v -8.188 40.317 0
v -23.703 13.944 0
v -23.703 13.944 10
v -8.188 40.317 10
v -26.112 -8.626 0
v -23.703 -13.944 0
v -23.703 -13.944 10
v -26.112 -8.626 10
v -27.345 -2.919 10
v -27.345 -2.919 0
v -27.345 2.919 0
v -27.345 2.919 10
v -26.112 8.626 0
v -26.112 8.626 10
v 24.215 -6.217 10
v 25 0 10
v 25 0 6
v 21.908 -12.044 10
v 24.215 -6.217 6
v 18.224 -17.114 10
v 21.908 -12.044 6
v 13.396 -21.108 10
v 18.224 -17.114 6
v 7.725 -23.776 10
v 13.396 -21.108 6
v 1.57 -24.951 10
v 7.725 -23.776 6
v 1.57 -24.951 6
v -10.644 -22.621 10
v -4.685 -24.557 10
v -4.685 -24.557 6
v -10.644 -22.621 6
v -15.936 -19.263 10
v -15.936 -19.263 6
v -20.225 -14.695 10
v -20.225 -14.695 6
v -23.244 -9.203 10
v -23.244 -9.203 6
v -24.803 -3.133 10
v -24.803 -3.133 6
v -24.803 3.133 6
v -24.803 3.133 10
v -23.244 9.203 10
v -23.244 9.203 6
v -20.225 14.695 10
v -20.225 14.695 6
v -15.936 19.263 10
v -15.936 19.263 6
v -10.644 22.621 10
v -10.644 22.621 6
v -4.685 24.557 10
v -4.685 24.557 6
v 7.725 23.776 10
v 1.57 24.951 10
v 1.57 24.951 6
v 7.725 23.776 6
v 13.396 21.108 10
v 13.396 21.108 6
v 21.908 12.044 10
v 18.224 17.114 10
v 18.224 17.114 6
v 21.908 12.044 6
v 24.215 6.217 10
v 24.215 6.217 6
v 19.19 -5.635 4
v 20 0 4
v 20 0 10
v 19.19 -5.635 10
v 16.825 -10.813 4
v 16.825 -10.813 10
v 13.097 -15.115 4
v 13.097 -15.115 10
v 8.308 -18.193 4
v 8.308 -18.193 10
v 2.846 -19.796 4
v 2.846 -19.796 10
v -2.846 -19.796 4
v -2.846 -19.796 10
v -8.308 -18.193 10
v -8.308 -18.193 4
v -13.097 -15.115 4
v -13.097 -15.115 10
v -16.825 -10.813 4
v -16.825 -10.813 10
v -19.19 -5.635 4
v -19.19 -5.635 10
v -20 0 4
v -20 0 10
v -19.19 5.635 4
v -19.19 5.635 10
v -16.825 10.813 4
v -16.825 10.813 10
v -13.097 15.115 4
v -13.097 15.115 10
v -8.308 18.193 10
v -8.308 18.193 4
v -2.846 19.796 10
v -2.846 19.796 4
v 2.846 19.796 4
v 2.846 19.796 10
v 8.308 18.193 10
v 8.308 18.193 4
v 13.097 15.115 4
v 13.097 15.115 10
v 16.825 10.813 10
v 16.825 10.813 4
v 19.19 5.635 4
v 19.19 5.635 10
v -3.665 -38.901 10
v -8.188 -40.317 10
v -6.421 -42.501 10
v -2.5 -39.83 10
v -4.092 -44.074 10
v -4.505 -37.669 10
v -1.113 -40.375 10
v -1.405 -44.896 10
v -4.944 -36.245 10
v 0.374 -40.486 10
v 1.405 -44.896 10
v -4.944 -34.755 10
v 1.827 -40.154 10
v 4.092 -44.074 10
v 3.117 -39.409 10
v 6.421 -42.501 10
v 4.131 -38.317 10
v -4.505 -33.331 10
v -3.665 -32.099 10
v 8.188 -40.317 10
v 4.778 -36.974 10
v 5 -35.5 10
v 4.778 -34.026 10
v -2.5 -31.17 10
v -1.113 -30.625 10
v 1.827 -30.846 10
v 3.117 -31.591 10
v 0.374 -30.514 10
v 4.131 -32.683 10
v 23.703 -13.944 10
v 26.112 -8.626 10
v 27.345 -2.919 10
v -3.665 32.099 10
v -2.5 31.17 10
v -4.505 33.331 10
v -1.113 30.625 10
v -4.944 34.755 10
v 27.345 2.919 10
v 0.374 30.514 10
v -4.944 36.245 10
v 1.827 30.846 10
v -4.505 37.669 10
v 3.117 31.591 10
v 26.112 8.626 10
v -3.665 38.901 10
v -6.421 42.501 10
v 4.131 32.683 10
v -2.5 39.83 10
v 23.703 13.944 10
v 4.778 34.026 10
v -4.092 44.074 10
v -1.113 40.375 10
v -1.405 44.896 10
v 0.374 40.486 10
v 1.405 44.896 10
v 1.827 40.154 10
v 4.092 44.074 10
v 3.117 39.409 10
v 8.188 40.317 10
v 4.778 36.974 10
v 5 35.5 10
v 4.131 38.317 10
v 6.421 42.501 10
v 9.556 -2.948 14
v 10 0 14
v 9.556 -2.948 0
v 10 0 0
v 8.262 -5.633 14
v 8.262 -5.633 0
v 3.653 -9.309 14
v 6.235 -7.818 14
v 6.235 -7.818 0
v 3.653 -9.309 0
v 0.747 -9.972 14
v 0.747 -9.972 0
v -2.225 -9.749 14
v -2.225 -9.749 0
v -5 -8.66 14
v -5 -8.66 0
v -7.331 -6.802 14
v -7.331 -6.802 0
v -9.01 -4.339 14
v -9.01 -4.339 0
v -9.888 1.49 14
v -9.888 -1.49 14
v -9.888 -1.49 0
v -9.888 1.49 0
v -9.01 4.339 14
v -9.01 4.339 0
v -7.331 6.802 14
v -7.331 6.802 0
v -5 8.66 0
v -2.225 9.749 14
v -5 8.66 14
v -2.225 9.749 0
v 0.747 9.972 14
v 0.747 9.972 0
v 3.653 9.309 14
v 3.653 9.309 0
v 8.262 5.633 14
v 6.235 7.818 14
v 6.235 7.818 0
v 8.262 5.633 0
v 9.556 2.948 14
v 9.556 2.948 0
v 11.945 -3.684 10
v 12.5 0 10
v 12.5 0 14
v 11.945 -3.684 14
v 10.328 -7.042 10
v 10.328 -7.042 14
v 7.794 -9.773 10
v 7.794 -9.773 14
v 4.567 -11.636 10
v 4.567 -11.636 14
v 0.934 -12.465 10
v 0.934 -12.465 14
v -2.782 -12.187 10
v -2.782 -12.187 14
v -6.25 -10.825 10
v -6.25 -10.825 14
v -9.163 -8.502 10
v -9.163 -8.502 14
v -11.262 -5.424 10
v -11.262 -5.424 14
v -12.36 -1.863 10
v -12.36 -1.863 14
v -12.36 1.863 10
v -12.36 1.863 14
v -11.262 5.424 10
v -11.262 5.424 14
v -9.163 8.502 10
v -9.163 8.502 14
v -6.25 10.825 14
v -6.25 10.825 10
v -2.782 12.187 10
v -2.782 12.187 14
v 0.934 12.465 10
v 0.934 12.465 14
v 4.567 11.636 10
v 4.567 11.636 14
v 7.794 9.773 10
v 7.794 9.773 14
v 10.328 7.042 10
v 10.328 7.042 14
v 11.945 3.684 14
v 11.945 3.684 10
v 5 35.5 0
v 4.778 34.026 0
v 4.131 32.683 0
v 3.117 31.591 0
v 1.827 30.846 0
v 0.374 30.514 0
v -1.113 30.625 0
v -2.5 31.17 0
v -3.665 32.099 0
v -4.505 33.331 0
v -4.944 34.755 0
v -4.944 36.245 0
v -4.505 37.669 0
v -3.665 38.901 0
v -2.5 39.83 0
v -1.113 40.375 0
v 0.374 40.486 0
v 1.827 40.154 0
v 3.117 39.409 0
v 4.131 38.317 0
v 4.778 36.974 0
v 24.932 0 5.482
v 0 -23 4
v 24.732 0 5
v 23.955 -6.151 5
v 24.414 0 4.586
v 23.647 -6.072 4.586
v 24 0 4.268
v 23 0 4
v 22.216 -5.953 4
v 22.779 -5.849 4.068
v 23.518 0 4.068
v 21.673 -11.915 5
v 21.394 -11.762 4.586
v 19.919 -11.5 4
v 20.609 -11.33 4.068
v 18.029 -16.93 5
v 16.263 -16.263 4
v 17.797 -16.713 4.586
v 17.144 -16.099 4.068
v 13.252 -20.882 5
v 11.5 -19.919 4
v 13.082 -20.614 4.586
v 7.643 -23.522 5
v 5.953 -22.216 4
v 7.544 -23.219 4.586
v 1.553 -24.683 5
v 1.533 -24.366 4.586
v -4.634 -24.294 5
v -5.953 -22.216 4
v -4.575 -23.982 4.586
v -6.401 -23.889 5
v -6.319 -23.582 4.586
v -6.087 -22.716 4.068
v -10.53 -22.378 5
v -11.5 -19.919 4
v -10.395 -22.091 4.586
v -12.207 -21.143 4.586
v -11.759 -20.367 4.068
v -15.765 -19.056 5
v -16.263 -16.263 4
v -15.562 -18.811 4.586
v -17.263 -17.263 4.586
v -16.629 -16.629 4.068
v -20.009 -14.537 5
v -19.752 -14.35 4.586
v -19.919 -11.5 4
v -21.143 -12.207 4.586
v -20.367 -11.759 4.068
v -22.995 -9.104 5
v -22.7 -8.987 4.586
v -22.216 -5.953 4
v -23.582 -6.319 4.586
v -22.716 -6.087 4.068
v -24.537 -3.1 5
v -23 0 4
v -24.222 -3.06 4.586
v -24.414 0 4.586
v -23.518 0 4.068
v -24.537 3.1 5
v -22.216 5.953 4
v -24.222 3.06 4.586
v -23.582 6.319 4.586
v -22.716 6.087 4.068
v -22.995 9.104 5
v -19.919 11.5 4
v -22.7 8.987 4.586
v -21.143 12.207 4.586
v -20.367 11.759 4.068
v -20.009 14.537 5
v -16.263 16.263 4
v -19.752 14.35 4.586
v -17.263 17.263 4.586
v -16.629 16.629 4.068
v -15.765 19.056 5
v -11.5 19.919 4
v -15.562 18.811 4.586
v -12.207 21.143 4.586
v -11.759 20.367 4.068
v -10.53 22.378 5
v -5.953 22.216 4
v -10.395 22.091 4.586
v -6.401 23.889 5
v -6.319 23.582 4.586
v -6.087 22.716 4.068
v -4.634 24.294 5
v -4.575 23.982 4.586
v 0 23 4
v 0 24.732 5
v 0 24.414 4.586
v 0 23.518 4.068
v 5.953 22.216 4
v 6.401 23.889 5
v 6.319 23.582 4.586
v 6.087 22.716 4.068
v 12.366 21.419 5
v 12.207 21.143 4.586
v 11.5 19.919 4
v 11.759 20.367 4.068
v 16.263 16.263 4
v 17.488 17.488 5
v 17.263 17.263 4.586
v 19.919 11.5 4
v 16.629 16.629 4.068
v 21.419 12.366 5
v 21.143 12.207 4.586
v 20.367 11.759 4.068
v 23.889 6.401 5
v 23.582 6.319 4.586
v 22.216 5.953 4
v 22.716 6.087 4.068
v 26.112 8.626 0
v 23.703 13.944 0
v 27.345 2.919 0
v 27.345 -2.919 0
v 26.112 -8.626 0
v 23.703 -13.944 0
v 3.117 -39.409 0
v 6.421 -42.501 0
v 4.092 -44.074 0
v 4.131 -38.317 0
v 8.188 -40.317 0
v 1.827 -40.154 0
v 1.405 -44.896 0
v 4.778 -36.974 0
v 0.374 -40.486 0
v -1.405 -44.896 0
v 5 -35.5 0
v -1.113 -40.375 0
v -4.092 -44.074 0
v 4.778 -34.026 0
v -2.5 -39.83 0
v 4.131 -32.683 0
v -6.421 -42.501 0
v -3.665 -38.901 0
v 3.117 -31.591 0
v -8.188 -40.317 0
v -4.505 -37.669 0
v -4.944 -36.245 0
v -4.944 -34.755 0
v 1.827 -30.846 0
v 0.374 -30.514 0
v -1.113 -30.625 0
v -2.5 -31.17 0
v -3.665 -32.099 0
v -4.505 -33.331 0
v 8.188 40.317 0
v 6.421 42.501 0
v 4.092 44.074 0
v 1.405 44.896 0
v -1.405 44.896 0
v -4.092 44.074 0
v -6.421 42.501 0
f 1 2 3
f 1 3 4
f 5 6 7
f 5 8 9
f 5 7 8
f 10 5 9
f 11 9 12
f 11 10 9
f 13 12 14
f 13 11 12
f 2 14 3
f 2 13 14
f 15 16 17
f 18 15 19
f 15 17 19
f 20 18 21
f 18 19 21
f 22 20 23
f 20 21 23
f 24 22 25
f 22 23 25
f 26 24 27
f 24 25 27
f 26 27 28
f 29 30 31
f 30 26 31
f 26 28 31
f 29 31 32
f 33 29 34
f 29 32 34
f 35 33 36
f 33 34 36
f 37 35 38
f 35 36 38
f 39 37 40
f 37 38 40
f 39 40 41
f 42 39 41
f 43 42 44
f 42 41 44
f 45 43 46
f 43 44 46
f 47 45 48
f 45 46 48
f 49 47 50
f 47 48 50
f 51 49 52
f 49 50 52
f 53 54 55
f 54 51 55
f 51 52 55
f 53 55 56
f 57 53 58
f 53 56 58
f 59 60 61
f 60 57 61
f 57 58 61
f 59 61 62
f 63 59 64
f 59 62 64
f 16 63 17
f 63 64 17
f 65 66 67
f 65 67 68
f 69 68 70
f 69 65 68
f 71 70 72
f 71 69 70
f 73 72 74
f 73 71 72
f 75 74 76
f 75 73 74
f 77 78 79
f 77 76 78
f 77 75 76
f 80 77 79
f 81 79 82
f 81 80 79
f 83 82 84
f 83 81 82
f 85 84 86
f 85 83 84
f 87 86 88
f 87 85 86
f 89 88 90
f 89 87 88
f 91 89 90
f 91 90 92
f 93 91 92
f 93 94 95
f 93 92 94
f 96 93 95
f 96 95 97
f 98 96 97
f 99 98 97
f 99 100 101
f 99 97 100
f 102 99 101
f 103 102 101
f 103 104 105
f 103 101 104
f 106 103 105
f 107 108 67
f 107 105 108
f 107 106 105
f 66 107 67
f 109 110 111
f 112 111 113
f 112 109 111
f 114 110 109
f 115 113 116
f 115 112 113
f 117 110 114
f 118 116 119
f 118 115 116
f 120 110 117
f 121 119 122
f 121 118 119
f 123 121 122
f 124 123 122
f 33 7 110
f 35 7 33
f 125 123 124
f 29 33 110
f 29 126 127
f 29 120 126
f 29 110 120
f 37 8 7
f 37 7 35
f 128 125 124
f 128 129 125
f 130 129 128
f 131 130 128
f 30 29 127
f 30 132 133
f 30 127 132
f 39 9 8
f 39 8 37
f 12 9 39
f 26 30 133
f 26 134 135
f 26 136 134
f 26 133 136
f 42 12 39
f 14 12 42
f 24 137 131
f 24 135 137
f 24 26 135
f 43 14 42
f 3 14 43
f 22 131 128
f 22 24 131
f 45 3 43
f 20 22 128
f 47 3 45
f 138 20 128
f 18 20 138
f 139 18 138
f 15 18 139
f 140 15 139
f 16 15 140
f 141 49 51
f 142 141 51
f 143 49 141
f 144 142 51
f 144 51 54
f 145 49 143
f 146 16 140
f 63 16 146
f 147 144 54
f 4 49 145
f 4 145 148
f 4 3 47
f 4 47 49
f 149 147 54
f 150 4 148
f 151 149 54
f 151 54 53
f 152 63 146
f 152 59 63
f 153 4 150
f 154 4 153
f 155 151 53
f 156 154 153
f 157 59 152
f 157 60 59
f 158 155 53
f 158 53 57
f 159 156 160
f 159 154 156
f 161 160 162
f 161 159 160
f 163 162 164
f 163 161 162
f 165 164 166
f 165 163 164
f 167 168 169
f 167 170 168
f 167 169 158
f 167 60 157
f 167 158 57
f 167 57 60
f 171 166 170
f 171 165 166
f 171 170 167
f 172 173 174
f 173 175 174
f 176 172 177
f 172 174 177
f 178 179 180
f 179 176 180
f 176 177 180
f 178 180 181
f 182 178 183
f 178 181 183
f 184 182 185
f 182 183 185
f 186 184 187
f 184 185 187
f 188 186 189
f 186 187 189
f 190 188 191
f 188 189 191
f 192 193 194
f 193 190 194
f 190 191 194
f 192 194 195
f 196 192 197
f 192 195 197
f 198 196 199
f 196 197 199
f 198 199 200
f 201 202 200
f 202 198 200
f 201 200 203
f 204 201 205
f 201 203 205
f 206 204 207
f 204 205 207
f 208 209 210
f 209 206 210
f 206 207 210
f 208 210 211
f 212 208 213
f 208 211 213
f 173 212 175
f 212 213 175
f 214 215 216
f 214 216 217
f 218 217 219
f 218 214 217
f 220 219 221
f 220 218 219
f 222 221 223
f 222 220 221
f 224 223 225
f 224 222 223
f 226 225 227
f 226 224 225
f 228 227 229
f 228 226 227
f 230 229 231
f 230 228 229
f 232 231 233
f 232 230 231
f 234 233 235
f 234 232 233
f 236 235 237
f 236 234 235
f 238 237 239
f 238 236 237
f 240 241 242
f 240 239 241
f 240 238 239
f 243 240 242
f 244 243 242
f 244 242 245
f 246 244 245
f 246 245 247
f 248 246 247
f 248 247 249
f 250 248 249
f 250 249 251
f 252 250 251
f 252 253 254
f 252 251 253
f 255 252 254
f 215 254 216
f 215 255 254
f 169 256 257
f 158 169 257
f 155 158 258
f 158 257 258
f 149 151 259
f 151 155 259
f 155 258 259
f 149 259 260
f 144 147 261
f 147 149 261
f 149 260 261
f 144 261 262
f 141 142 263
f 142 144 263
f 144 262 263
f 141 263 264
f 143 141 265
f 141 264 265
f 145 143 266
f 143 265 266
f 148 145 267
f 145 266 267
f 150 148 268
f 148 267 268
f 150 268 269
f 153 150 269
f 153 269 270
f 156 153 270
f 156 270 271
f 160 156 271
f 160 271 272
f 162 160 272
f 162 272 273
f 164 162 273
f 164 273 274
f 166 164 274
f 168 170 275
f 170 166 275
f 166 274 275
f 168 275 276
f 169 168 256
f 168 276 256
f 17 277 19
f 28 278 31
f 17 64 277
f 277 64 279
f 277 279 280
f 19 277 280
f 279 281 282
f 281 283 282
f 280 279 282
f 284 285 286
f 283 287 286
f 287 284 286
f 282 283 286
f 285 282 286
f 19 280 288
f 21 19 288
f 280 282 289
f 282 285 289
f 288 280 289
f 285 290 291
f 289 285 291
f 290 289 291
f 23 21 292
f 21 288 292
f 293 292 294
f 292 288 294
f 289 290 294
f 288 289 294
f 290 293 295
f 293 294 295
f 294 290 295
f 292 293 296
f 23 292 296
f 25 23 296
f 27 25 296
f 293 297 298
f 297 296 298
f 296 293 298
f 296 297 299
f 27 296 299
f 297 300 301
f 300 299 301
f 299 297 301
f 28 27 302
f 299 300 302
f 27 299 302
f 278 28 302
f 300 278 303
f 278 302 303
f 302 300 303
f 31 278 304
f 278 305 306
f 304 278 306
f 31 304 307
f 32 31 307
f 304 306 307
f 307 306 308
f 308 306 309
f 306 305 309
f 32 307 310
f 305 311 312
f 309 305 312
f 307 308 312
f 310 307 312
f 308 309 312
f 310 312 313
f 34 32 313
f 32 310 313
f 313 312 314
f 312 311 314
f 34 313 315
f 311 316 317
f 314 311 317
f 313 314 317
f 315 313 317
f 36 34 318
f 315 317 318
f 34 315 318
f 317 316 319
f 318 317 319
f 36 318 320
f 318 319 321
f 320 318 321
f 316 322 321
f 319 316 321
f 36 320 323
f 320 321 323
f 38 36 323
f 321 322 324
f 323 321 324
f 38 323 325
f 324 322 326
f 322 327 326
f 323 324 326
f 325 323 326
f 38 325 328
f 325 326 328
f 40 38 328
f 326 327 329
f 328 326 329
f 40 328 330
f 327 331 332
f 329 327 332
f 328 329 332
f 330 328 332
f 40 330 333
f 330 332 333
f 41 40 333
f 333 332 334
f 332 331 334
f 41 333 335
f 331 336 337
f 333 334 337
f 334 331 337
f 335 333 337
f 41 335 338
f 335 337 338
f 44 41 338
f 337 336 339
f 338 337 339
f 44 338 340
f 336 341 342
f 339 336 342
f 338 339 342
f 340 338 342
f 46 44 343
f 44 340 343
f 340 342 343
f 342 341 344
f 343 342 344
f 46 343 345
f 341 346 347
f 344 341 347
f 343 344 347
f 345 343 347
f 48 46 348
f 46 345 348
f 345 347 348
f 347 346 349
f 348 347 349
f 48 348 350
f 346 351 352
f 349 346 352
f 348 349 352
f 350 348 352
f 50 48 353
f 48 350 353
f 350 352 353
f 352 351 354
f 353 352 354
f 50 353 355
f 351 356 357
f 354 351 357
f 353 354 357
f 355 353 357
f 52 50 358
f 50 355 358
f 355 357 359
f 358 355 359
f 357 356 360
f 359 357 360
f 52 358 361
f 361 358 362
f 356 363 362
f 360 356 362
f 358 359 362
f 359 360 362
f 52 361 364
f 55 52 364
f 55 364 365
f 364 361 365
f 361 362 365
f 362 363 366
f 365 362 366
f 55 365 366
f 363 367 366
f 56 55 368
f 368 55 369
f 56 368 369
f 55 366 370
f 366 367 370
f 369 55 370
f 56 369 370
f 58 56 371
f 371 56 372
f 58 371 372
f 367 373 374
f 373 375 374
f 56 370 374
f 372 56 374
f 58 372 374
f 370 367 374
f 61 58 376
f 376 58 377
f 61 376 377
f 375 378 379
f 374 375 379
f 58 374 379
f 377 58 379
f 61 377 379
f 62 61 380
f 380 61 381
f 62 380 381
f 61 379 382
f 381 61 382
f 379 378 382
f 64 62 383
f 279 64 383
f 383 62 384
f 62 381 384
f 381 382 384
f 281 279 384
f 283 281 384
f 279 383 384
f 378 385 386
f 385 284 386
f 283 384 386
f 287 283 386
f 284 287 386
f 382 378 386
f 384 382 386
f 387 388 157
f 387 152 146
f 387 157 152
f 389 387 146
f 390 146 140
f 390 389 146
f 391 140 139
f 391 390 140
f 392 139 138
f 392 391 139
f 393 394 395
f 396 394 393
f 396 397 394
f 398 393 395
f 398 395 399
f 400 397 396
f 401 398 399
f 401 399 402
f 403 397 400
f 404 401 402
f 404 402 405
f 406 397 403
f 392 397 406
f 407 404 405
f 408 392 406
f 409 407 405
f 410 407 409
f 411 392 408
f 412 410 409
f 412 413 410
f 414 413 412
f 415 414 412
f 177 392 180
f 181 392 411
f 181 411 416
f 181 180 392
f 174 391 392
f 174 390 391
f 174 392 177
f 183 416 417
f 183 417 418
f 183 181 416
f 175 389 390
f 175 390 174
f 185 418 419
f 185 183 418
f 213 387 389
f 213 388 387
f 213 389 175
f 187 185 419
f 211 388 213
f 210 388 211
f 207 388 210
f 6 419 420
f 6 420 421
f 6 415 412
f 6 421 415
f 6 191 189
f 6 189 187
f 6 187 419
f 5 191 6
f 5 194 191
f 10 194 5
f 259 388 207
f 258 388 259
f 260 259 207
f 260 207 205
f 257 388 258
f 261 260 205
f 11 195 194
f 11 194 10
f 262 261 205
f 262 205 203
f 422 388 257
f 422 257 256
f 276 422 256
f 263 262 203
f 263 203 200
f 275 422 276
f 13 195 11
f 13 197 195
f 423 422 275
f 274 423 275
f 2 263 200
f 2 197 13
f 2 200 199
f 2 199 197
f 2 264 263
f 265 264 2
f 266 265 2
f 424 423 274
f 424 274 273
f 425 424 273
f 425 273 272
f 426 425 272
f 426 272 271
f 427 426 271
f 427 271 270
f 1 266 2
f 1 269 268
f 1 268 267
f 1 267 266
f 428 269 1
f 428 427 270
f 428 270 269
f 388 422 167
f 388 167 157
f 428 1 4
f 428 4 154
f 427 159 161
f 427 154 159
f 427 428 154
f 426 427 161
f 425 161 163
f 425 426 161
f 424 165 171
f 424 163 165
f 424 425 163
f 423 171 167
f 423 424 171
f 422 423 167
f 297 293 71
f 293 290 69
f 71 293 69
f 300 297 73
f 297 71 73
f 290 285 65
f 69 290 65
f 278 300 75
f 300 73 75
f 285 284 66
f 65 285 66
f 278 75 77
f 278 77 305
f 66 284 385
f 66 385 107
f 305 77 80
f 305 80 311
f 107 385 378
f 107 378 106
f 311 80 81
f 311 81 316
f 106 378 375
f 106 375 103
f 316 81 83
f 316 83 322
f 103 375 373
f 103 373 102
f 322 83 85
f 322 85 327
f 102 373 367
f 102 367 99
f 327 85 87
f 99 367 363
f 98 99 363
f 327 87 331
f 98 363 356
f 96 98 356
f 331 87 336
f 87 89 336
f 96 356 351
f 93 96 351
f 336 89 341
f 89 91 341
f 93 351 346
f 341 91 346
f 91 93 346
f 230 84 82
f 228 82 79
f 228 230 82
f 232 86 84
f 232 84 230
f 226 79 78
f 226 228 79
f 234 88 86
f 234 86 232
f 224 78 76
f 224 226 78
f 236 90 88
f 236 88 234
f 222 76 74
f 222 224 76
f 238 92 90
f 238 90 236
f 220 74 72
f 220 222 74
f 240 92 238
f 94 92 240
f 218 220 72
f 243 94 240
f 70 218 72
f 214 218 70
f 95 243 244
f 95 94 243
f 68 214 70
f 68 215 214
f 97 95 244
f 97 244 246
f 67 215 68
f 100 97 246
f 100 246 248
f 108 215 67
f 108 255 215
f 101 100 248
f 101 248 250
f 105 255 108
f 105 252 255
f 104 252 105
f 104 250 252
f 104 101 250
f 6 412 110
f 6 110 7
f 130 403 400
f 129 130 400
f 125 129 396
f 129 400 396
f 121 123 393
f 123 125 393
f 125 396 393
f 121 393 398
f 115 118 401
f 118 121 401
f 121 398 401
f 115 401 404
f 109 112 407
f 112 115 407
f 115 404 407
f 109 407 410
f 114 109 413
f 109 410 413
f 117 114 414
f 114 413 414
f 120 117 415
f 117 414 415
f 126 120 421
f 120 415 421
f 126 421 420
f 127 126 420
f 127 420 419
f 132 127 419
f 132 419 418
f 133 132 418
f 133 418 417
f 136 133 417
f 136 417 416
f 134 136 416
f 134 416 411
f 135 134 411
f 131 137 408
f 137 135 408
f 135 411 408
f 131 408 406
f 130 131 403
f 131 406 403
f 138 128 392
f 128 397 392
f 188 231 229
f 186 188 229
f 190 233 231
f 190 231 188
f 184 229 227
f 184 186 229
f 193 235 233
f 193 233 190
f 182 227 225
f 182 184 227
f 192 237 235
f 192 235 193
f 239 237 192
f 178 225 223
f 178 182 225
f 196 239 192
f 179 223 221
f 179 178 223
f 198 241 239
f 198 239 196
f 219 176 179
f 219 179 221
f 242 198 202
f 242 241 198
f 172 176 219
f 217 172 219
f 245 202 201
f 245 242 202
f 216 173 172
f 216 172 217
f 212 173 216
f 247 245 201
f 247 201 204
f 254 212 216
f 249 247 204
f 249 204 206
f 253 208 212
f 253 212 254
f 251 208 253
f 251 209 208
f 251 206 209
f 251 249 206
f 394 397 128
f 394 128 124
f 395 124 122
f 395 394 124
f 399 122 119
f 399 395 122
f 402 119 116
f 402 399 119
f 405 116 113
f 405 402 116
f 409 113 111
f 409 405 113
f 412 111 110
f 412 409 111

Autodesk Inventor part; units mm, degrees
ref_plane "YZ Plane" through (0, 0, 0) normal (1, 0, 0) x (0, 1, 0)
ref_plane "XZ Plane" through (0, 0, 0) normal (0, 1, 0) x (-1, 0, 0)
ref_plane "XY Plane" through (0, 0, 0) normal (0, 0, 1) x (1, 0, 0)
sketch "Sketch1" plane through (0, 0, 0) normal (0, 0, 1) x (1, 0, 0)
  circle A0 centre (0, 0) radius 10
  circle A1 centre (0, 35.5) radius 5
  circle A2 centre (0, -35.5) radius 5
  circle A3 centre (0, -35.5) radius 9.5
  circle A4 centre (0, 35.5) radius 9.5
  circle A5 centre (0, 0) radius 25
  circle A6 centre (0, 0) radius 20
  line L0 (-23.7028, 13.9437) -> (-8.1883, 40.3169)
  line L1 (8.1883, 40.3169) -> (23.7028, 13.9437)
  line L2 (8.1883, -40.3169) -> (23.7028, -13.9437)
  line L3 (-8.1883, -40.3169) -> (-23.7028, -13.9437)
  arc A7 (-4.4942, 27.1303) -> (-4.4942, -27.1303) centre (0, 0) ccw
  arc A8 (4.4942, -27.1303) -> (4.4942, 27.1303) centre (0, 0) ccw
  dimension "d0" = 20
  dimension "d4" = 10
  dimension "d5" = 10
  dimension "d7" = 19
  dimension "d8" = 50
  dimension "d9" = 40
extrude "Extrusion1" add sketch "Sketch1" along normal blind 10
sketch "Sketch2" plane through (0, 0, 10) normal (0, 0, 1) x (1, 0, 0)
  circle A0 centre (0, 0) radius 10
  circle A1 centre (0, 0) radius 12.5
  dimension "d14" = 25
extrude "Extrusion2" add sketch "Sketch2" along normal blind 4
sketch "Sketch3" plane through (0, 0, 0) normal (0, 0, -1) x (-1, 0, 0)
  circle A0 centre (0, 0) radius 20
  circle A1 centre (0, 0) radius 25
extrude "Extrusion3" add sketch "Sketch3" against normal blind 4
fillet "Fillet1" radius 2 1 edges at (-25, 0, 4)
properties part number "bearing"
